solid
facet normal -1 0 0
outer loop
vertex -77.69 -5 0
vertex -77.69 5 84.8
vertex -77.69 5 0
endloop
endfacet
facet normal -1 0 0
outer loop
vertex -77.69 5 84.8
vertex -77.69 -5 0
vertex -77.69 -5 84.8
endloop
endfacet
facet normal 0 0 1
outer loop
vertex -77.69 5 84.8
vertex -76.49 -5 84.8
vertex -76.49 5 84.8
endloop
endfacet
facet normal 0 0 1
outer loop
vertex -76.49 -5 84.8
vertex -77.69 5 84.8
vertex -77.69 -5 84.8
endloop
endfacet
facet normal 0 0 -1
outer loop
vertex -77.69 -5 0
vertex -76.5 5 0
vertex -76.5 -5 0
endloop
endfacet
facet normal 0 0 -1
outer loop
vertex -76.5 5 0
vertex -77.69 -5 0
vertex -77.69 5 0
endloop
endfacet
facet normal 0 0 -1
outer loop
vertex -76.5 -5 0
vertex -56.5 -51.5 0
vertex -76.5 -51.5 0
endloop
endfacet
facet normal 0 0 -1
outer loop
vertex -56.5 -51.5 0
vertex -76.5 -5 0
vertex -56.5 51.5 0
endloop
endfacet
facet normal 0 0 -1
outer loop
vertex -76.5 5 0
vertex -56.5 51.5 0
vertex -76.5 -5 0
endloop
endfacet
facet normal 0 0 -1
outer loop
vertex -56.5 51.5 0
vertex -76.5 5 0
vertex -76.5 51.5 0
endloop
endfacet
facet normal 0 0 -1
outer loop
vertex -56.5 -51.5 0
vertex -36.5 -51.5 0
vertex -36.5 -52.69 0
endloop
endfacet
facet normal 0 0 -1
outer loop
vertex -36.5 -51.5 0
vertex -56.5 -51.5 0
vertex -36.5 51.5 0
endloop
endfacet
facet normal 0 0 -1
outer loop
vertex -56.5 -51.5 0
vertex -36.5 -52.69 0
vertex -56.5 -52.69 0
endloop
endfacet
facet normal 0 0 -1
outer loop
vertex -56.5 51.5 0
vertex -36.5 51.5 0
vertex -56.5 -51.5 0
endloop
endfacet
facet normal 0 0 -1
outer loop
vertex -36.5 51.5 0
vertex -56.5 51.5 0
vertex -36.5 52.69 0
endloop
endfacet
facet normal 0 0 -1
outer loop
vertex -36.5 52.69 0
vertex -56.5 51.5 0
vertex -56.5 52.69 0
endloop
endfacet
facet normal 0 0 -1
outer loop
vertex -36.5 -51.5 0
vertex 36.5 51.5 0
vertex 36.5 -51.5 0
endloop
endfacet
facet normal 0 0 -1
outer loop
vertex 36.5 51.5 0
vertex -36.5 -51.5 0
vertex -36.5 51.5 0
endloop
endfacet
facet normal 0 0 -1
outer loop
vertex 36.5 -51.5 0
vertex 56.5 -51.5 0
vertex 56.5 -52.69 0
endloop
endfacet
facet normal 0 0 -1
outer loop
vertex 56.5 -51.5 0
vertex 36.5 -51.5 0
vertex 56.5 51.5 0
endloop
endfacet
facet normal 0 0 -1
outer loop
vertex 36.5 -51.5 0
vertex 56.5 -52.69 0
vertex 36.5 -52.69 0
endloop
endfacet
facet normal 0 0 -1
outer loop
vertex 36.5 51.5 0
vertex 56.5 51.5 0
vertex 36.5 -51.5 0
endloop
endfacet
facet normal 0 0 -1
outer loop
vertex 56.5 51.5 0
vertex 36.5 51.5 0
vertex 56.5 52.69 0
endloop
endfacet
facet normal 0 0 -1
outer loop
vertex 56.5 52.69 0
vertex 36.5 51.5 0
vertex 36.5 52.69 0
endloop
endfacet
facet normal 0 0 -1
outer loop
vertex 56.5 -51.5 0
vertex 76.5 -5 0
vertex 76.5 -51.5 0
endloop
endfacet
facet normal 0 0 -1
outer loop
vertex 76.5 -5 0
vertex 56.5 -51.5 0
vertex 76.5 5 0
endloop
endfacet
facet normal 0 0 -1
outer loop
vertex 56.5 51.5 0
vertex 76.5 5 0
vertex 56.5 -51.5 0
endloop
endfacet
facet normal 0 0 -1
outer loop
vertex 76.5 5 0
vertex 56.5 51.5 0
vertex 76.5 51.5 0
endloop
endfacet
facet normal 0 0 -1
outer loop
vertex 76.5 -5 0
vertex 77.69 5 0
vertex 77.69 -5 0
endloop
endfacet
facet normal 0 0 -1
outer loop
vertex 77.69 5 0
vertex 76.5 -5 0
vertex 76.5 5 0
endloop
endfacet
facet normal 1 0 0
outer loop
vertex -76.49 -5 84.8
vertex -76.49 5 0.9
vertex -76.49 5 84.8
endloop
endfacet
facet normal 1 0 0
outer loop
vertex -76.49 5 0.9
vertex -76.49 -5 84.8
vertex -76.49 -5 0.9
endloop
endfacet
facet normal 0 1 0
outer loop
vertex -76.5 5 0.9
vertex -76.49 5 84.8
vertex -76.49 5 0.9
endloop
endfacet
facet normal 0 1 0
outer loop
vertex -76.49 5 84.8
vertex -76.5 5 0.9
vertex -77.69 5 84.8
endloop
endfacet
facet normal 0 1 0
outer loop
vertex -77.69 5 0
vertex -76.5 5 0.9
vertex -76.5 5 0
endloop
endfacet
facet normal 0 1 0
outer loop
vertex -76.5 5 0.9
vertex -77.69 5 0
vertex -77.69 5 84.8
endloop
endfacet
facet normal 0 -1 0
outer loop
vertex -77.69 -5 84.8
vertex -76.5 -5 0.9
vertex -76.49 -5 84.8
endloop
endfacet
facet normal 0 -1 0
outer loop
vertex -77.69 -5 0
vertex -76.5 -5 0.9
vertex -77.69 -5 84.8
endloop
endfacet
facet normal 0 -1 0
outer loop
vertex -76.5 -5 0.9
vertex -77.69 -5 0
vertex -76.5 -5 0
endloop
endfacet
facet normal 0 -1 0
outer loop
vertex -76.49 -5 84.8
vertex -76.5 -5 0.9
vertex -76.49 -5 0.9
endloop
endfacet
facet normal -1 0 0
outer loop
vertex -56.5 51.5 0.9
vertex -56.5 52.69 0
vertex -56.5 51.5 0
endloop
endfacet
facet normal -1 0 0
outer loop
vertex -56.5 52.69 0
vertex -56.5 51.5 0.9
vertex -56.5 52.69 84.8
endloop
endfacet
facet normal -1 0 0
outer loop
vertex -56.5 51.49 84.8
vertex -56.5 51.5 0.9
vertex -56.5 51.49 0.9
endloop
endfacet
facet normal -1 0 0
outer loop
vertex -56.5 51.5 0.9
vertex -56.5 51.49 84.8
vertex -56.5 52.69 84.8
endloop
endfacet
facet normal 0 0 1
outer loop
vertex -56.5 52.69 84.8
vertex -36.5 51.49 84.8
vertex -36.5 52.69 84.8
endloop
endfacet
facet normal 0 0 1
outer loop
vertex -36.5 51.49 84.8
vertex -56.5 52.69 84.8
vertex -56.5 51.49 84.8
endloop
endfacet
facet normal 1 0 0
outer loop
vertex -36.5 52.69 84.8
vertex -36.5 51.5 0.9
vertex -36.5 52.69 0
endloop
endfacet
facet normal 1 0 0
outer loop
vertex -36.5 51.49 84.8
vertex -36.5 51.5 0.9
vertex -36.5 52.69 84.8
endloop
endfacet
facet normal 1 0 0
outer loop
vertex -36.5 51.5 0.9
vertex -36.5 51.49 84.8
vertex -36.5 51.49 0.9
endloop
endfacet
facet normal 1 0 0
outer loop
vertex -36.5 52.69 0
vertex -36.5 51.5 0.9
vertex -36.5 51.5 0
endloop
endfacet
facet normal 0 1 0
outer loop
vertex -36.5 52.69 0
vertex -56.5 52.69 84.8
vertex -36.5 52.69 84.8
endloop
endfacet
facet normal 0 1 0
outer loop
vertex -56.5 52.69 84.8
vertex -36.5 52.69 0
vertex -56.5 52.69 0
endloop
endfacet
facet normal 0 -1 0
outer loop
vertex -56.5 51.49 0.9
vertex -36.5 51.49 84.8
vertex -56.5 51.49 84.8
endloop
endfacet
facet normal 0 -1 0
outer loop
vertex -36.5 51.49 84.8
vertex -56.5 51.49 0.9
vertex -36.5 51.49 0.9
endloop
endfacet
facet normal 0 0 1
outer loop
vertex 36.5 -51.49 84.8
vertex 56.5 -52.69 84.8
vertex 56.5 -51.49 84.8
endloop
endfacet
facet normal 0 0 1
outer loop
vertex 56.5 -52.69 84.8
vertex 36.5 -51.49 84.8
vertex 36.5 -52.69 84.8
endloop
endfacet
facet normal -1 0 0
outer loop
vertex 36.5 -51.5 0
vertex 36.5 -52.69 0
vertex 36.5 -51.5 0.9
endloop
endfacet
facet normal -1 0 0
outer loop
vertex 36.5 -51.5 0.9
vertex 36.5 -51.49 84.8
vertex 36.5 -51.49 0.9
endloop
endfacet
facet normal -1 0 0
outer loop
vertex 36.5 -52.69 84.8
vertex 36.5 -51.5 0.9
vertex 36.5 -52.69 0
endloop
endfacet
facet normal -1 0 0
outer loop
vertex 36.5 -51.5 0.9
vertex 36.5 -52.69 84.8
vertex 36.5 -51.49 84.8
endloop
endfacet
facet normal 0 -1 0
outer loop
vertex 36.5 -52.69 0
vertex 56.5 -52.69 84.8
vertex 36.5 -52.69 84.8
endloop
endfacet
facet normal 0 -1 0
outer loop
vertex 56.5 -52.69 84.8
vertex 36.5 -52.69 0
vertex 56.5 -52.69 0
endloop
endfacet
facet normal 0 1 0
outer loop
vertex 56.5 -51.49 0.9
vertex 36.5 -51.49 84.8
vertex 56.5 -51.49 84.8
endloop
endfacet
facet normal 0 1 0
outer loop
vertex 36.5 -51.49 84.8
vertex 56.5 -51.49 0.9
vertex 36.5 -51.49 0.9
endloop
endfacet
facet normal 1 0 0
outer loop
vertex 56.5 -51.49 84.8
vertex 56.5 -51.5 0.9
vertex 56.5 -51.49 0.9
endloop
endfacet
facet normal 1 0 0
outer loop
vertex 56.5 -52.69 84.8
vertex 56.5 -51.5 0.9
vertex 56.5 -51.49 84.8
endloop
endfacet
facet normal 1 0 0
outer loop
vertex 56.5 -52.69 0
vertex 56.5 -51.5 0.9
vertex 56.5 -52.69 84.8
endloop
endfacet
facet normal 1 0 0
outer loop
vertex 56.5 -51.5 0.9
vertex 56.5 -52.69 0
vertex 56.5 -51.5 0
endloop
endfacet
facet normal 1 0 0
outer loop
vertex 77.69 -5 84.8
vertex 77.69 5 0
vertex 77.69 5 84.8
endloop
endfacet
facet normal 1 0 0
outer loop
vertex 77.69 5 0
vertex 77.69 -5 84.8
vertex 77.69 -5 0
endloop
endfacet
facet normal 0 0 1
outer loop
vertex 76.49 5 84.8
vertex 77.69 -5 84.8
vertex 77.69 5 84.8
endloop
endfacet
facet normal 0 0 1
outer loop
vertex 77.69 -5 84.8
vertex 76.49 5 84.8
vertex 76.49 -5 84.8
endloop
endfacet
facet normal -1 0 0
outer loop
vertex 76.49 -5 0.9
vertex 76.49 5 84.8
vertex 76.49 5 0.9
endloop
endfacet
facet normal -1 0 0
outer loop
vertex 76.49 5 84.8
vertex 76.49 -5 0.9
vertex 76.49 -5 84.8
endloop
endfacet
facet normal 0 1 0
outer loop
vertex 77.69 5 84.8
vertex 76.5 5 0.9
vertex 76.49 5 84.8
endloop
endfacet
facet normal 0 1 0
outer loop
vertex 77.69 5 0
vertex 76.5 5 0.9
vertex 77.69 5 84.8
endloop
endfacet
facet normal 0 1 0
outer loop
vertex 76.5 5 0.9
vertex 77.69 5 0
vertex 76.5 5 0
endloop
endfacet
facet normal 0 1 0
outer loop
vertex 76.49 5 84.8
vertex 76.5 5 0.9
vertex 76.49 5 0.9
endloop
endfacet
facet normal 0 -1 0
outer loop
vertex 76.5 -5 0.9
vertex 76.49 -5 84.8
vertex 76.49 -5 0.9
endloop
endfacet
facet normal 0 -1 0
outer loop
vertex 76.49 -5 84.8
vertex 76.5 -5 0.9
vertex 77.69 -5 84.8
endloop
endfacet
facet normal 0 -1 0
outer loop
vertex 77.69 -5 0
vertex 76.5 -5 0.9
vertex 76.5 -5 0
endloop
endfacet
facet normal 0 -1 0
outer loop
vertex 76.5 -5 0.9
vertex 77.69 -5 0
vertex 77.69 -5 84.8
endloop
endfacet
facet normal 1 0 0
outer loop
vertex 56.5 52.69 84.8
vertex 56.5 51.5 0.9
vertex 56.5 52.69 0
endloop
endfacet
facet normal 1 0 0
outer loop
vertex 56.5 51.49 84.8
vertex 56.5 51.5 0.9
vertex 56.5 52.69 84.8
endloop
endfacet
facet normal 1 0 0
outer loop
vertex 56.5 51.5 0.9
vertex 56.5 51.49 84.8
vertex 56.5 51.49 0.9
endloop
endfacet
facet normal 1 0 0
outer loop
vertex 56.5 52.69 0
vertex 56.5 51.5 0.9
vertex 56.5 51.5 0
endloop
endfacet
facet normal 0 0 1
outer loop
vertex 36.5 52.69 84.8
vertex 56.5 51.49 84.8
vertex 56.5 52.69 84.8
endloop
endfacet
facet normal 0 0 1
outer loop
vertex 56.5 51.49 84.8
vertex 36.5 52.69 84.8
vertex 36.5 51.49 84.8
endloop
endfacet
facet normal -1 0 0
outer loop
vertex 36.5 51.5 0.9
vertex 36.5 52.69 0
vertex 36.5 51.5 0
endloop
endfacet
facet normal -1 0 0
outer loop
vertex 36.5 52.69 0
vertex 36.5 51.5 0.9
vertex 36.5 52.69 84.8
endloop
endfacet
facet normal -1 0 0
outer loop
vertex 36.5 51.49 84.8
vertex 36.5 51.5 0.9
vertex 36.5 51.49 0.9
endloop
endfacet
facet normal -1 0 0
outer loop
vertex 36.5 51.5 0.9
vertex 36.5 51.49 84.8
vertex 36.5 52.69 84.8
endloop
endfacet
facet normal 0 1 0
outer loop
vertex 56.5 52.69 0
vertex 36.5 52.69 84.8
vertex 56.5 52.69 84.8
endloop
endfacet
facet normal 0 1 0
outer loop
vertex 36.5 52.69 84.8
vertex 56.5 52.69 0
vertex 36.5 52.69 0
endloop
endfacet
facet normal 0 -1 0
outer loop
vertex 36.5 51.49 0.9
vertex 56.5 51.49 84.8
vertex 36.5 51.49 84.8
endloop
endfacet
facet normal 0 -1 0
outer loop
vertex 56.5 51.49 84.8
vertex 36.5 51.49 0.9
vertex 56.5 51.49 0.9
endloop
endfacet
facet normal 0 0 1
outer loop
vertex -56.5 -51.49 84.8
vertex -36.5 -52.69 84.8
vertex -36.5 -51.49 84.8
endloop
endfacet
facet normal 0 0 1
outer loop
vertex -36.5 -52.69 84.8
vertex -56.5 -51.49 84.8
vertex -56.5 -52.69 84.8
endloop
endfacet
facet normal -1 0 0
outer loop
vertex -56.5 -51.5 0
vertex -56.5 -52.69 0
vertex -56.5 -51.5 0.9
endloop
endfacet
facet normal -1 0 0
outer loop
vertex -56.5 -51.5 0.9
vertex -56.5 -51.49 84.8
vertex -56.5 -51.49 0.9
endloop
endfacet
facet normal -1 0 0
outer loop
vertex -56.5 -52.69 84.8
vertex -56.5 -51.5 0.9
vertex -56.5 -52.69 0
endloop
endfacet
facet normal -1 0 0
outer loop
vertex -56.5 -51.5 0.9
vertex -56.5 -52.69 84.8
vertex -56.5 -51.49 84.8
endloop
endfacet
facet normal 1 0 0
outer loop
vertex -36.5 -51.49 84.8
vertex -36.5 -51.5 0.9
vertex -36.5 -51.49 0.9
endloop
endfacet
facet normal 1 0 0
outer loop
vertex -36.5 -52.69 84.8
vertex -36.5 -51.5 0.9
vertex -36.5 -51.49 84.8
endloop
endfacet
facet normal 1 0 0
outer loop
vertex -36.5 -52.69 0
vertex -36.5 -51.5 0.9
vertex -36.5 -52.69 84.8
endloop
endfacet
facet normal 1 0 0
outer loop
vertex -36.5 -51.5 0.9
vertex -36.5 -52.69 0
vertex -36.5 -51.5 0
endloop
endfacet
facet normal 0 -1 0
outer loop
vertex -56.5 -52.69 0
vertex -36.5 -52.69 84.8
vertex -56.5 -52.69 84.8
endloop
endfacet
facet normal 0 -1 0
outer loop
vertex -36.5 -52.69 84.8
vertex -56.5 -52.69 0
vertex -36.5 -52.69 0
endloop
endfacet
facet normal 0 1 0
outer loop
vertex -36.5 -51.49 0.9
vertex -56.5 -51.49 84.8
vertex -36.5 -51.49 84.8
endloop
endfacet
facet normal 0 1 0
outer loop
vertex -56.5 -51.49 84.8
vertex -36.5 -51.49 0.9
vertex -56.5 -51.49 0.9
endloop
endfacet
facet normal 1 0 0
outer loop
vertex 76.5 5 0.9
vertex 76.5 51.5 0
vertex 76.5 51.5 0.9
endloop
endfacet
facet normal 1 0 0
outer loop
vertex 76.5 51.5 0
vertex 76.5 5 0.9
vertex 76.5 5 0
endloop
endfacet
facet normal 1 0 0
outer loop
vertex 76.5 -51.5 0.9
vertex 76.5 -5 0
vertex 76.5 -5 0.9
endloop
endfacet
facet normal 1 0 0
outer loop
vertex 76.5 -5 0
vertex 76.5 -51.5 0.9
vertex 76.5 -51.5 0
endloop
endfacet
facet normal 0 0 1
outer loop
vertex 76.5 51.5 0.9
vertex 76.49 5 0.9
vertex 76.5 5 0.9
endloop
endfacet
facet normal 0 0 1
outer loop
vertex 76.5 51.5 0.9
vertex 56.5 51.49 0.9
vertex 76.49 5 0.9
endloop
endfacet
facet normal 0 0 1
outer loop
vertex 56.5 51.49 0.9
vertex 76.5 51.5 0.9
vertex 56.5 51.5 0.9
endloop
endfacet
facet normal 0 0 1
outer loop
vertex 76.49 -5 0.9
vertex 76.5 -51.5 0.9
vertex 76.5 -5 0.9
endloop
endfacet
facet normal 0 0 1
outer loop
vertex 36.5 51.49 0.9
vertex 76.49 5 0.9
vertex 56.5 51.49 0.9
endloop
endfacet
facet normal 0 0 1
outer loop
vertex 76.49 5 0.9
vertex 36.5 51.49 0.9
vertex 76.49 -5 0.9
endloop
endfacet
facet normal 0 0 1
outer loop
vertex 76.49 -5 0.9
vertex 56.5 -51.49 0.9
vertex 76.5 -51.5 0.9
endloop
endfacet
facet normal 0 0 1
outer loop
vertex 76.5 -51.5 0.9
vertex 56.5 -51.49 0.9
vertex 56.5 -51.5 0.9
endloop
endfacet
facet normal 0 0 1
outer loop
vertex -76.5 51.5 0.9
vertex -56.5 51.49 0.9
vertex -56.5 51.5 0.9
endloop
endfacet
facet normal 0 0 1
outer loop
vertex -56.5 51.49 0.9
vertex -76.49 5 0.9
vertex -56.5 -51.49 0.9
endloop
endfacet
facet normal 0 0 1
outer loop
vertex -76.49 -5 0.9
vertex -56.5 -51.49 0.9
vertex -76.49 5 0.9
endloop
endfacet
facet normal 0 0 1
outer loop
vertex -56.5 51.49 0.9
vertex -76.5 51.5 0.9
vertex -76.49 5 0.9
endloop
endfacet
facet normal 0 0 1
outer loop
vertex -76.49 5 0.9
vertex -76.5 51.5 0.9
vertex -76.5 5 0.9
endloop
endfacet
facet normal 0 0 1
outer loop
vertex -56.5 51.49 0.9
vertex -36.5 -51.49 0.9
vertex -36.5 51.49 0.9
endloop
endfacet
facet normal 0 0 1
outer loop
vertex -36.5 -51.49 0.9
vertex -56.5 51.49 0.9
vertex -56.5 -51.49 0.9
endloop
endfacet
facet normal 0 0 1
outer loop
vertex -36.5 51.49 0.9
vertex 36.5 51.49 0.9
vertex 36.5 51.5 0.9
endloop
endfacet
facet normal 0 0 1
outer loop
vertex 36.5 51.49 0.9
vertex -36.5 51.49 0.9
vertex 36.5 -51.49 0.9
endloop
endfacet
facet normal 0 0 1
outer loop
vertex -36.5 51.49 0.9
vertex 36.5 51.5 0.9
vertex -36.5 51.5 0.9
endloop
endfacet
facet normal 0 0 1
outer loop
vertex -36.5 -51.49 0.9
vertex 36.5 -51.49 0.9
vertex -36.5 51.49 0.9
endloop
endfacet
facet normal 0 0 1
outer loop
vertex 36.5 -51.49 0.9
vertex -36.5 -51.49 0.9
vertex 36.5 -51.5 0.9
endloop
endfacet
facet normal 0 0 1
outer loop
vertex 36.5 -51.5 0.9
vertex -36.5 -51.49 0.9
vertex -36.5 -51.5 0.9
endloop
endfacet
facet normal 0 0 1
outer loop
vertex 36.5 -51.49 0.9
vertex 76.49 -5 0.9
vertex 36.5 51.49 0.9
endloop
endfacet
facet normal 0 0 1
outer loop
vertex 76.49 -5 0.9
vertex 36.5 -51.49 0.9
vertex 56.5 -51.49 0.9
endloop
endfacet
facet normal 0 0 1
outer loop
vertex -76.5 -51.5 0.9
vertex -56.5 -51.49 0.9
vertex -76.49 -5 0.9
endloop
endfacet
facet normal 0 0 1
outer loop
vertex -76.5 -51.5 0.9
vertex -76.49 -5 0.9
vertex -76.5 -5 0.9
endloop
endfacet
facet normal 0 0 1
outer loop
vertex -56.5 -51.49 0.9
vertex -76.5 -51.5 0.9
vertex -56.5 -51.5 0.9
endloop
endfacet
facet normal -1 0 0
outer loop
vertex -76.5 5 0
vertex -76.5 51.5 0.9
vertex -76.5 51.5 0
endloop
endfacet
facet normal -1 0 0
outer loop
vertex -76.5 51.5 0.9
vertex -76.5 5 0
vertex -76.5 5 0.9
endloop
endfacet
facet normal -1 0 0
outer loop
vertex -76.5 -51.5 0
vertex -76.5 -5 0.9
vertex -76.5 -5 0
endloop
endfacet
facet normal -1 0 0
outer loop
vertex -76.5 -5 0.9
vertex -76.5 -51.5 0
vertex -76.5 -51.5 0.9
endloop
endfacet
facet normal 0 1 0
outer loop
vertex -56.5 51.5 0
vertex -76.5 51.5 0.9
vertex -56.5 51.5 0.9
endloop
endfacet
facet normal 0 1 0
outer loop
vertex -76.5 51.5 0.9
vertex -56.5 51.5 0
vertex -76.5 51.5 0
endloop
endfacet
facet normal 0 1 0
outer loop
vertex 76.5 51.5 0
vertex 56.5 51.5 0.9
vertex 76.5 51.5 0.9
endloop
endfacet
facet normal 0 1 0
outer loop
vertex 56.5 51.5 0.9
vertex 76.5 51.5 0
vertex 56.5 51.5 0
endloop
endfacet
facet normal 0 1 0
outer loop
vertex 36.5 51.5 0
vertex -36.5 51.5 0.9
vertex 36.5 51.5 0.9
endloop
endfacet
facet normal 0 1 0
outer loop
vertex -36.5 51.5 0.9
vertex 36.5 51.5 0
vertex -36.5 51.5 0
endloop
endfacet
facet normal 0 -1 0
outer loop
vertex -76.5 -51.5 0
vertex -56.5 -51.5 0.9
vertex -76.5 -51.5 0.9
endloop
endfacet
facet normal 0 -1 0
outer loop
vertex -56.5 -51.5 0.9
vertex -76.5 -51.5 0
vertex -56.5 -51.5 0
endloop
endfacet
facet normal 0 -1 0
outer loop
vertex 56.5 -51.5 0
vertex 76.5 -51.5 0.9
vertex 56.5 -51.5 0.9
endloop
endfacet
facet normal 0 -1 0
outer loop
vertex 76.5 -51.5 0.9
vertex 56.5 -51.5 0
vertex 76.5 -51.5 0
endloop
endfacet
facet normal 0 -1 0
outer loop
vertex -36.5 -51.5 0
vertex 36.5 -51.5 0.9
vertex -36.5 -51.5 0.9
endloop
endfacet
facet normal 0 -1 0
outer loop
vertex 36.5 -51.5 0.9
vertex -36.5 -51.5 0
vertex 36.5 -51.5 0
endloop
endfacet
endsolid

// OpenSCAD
// -*- mode: SCAD ; c-file-style: "ellemtel" ; coding: utf-8 -*-
//
// correctly sized simple shape to stack four picture 135 type film strips
//
// (c) 2018 Roland Sieker <ospalh@gmail.com>
// Licence: CC-BY-SA 4.0


// ... to preview. You will get all parts when you click "Create Thing".
part = "stack"; // [stack: Stapler, lid: Deckel]

// Set this to "render" and click on "Create Thing" when done with the setup.
preview = 1; // [0:render, 1:preview]
// not needed


l1 = 150;
ex = 3;
num = 1;
lld = l1*num;
ll = lld + ex;
ey = 1;
w1 = 102;
wst = w1+ey; // 9.2 mm + clearance
wld = w1-ey; // Make it fit between the plates without problems

w = 1.2;  // Wall width

h = 83; // I have a lot of film strips i want to stack. I mean, a *lot*.
epl = 10;
spl = 20;
spo = 20;

/* [Hidden] */

// Done with the customizer

// *******************************************************
// Extra parameters. These can be changed reasonably safely.


p = 0.9;  // Bottom, top plate hight
c = 0.4;  // Clearance
angle = 60; // Overhangs much below 60 degrees are a problem for me

// *******************************************************
// Some shortcuts. These shouldn't be changed

tau = 2 * PI;  // pi is still wrong. tau = circumference / r

xy_factor = 1/tan(angle);
// To get from a hight to a horizontal width inclined correctly
z_factor = tan(angle);  // The other way around

he = h + 2*p;
spo2 = ll/2 - spo - spl;

some_distance = 50;
ms = 0.01;  // Muggeseggele.

// fn for differently sized objects and fs, fa; all for preview or rendering.
pna = 40;
pnb = 15;
pa = 5;
ps = 1;
rna = 180;
rnb = 30;
ra = 1;
rs = 0.1;
function na() = (preview) ? pna : rna;
function nb() = (preview) ? pnb : rnb;
$fs = (preview) ? ps : rs;
$fa = (preview) ? pa : ra;

// *******************************************************
// End setup



// *******************************************************
// Generate the parts

print_part();
// preview_parts();
// stack_parts();



module print_part()
{
   if ("stack" == part)
   {
      stack();
   }
   if ("lid" == part)
   {
      lid();
   }
}

module preview_parts()
{
   stack();
   translate([0, some_distance, 0])
   {
      lid();
   }
}

module stack_parts()
{
   // intersection()
   {
      color("yellow")
      {
         stack();
      }
      translate([0,0, 3*p])
      {
         color("red")
         {
            lid();
         }
      }
   }
}

// *******************************************************
// Code for the parts themselves

module stack()
{
   translate([0,0,p/2])
   {
      cube([ll, wst, p], center=true);
   }
   plates();
}


module lid()
{
   translate([0,0,p/2])
   {
      cube([lld, wld, p], center=true);
   }
}


module plates()
{
   end_plate();
   side_plate();
   rotate(180)
   {
      side_plate();
   }
   mirror()
   {
      end_plate();
      side_plate();
      rotate(180)
      {
         side_plate();
      }
   }
}

module end_plate()
{
   translate([ll/2-ms , -epl/2,0])
   {
      cube([w, epl, he]);
   }
}

module side_plate()
{
   translate([spo2, wst/2-ms,0])
   {
      cube([spl, w, he]);
   }
}
